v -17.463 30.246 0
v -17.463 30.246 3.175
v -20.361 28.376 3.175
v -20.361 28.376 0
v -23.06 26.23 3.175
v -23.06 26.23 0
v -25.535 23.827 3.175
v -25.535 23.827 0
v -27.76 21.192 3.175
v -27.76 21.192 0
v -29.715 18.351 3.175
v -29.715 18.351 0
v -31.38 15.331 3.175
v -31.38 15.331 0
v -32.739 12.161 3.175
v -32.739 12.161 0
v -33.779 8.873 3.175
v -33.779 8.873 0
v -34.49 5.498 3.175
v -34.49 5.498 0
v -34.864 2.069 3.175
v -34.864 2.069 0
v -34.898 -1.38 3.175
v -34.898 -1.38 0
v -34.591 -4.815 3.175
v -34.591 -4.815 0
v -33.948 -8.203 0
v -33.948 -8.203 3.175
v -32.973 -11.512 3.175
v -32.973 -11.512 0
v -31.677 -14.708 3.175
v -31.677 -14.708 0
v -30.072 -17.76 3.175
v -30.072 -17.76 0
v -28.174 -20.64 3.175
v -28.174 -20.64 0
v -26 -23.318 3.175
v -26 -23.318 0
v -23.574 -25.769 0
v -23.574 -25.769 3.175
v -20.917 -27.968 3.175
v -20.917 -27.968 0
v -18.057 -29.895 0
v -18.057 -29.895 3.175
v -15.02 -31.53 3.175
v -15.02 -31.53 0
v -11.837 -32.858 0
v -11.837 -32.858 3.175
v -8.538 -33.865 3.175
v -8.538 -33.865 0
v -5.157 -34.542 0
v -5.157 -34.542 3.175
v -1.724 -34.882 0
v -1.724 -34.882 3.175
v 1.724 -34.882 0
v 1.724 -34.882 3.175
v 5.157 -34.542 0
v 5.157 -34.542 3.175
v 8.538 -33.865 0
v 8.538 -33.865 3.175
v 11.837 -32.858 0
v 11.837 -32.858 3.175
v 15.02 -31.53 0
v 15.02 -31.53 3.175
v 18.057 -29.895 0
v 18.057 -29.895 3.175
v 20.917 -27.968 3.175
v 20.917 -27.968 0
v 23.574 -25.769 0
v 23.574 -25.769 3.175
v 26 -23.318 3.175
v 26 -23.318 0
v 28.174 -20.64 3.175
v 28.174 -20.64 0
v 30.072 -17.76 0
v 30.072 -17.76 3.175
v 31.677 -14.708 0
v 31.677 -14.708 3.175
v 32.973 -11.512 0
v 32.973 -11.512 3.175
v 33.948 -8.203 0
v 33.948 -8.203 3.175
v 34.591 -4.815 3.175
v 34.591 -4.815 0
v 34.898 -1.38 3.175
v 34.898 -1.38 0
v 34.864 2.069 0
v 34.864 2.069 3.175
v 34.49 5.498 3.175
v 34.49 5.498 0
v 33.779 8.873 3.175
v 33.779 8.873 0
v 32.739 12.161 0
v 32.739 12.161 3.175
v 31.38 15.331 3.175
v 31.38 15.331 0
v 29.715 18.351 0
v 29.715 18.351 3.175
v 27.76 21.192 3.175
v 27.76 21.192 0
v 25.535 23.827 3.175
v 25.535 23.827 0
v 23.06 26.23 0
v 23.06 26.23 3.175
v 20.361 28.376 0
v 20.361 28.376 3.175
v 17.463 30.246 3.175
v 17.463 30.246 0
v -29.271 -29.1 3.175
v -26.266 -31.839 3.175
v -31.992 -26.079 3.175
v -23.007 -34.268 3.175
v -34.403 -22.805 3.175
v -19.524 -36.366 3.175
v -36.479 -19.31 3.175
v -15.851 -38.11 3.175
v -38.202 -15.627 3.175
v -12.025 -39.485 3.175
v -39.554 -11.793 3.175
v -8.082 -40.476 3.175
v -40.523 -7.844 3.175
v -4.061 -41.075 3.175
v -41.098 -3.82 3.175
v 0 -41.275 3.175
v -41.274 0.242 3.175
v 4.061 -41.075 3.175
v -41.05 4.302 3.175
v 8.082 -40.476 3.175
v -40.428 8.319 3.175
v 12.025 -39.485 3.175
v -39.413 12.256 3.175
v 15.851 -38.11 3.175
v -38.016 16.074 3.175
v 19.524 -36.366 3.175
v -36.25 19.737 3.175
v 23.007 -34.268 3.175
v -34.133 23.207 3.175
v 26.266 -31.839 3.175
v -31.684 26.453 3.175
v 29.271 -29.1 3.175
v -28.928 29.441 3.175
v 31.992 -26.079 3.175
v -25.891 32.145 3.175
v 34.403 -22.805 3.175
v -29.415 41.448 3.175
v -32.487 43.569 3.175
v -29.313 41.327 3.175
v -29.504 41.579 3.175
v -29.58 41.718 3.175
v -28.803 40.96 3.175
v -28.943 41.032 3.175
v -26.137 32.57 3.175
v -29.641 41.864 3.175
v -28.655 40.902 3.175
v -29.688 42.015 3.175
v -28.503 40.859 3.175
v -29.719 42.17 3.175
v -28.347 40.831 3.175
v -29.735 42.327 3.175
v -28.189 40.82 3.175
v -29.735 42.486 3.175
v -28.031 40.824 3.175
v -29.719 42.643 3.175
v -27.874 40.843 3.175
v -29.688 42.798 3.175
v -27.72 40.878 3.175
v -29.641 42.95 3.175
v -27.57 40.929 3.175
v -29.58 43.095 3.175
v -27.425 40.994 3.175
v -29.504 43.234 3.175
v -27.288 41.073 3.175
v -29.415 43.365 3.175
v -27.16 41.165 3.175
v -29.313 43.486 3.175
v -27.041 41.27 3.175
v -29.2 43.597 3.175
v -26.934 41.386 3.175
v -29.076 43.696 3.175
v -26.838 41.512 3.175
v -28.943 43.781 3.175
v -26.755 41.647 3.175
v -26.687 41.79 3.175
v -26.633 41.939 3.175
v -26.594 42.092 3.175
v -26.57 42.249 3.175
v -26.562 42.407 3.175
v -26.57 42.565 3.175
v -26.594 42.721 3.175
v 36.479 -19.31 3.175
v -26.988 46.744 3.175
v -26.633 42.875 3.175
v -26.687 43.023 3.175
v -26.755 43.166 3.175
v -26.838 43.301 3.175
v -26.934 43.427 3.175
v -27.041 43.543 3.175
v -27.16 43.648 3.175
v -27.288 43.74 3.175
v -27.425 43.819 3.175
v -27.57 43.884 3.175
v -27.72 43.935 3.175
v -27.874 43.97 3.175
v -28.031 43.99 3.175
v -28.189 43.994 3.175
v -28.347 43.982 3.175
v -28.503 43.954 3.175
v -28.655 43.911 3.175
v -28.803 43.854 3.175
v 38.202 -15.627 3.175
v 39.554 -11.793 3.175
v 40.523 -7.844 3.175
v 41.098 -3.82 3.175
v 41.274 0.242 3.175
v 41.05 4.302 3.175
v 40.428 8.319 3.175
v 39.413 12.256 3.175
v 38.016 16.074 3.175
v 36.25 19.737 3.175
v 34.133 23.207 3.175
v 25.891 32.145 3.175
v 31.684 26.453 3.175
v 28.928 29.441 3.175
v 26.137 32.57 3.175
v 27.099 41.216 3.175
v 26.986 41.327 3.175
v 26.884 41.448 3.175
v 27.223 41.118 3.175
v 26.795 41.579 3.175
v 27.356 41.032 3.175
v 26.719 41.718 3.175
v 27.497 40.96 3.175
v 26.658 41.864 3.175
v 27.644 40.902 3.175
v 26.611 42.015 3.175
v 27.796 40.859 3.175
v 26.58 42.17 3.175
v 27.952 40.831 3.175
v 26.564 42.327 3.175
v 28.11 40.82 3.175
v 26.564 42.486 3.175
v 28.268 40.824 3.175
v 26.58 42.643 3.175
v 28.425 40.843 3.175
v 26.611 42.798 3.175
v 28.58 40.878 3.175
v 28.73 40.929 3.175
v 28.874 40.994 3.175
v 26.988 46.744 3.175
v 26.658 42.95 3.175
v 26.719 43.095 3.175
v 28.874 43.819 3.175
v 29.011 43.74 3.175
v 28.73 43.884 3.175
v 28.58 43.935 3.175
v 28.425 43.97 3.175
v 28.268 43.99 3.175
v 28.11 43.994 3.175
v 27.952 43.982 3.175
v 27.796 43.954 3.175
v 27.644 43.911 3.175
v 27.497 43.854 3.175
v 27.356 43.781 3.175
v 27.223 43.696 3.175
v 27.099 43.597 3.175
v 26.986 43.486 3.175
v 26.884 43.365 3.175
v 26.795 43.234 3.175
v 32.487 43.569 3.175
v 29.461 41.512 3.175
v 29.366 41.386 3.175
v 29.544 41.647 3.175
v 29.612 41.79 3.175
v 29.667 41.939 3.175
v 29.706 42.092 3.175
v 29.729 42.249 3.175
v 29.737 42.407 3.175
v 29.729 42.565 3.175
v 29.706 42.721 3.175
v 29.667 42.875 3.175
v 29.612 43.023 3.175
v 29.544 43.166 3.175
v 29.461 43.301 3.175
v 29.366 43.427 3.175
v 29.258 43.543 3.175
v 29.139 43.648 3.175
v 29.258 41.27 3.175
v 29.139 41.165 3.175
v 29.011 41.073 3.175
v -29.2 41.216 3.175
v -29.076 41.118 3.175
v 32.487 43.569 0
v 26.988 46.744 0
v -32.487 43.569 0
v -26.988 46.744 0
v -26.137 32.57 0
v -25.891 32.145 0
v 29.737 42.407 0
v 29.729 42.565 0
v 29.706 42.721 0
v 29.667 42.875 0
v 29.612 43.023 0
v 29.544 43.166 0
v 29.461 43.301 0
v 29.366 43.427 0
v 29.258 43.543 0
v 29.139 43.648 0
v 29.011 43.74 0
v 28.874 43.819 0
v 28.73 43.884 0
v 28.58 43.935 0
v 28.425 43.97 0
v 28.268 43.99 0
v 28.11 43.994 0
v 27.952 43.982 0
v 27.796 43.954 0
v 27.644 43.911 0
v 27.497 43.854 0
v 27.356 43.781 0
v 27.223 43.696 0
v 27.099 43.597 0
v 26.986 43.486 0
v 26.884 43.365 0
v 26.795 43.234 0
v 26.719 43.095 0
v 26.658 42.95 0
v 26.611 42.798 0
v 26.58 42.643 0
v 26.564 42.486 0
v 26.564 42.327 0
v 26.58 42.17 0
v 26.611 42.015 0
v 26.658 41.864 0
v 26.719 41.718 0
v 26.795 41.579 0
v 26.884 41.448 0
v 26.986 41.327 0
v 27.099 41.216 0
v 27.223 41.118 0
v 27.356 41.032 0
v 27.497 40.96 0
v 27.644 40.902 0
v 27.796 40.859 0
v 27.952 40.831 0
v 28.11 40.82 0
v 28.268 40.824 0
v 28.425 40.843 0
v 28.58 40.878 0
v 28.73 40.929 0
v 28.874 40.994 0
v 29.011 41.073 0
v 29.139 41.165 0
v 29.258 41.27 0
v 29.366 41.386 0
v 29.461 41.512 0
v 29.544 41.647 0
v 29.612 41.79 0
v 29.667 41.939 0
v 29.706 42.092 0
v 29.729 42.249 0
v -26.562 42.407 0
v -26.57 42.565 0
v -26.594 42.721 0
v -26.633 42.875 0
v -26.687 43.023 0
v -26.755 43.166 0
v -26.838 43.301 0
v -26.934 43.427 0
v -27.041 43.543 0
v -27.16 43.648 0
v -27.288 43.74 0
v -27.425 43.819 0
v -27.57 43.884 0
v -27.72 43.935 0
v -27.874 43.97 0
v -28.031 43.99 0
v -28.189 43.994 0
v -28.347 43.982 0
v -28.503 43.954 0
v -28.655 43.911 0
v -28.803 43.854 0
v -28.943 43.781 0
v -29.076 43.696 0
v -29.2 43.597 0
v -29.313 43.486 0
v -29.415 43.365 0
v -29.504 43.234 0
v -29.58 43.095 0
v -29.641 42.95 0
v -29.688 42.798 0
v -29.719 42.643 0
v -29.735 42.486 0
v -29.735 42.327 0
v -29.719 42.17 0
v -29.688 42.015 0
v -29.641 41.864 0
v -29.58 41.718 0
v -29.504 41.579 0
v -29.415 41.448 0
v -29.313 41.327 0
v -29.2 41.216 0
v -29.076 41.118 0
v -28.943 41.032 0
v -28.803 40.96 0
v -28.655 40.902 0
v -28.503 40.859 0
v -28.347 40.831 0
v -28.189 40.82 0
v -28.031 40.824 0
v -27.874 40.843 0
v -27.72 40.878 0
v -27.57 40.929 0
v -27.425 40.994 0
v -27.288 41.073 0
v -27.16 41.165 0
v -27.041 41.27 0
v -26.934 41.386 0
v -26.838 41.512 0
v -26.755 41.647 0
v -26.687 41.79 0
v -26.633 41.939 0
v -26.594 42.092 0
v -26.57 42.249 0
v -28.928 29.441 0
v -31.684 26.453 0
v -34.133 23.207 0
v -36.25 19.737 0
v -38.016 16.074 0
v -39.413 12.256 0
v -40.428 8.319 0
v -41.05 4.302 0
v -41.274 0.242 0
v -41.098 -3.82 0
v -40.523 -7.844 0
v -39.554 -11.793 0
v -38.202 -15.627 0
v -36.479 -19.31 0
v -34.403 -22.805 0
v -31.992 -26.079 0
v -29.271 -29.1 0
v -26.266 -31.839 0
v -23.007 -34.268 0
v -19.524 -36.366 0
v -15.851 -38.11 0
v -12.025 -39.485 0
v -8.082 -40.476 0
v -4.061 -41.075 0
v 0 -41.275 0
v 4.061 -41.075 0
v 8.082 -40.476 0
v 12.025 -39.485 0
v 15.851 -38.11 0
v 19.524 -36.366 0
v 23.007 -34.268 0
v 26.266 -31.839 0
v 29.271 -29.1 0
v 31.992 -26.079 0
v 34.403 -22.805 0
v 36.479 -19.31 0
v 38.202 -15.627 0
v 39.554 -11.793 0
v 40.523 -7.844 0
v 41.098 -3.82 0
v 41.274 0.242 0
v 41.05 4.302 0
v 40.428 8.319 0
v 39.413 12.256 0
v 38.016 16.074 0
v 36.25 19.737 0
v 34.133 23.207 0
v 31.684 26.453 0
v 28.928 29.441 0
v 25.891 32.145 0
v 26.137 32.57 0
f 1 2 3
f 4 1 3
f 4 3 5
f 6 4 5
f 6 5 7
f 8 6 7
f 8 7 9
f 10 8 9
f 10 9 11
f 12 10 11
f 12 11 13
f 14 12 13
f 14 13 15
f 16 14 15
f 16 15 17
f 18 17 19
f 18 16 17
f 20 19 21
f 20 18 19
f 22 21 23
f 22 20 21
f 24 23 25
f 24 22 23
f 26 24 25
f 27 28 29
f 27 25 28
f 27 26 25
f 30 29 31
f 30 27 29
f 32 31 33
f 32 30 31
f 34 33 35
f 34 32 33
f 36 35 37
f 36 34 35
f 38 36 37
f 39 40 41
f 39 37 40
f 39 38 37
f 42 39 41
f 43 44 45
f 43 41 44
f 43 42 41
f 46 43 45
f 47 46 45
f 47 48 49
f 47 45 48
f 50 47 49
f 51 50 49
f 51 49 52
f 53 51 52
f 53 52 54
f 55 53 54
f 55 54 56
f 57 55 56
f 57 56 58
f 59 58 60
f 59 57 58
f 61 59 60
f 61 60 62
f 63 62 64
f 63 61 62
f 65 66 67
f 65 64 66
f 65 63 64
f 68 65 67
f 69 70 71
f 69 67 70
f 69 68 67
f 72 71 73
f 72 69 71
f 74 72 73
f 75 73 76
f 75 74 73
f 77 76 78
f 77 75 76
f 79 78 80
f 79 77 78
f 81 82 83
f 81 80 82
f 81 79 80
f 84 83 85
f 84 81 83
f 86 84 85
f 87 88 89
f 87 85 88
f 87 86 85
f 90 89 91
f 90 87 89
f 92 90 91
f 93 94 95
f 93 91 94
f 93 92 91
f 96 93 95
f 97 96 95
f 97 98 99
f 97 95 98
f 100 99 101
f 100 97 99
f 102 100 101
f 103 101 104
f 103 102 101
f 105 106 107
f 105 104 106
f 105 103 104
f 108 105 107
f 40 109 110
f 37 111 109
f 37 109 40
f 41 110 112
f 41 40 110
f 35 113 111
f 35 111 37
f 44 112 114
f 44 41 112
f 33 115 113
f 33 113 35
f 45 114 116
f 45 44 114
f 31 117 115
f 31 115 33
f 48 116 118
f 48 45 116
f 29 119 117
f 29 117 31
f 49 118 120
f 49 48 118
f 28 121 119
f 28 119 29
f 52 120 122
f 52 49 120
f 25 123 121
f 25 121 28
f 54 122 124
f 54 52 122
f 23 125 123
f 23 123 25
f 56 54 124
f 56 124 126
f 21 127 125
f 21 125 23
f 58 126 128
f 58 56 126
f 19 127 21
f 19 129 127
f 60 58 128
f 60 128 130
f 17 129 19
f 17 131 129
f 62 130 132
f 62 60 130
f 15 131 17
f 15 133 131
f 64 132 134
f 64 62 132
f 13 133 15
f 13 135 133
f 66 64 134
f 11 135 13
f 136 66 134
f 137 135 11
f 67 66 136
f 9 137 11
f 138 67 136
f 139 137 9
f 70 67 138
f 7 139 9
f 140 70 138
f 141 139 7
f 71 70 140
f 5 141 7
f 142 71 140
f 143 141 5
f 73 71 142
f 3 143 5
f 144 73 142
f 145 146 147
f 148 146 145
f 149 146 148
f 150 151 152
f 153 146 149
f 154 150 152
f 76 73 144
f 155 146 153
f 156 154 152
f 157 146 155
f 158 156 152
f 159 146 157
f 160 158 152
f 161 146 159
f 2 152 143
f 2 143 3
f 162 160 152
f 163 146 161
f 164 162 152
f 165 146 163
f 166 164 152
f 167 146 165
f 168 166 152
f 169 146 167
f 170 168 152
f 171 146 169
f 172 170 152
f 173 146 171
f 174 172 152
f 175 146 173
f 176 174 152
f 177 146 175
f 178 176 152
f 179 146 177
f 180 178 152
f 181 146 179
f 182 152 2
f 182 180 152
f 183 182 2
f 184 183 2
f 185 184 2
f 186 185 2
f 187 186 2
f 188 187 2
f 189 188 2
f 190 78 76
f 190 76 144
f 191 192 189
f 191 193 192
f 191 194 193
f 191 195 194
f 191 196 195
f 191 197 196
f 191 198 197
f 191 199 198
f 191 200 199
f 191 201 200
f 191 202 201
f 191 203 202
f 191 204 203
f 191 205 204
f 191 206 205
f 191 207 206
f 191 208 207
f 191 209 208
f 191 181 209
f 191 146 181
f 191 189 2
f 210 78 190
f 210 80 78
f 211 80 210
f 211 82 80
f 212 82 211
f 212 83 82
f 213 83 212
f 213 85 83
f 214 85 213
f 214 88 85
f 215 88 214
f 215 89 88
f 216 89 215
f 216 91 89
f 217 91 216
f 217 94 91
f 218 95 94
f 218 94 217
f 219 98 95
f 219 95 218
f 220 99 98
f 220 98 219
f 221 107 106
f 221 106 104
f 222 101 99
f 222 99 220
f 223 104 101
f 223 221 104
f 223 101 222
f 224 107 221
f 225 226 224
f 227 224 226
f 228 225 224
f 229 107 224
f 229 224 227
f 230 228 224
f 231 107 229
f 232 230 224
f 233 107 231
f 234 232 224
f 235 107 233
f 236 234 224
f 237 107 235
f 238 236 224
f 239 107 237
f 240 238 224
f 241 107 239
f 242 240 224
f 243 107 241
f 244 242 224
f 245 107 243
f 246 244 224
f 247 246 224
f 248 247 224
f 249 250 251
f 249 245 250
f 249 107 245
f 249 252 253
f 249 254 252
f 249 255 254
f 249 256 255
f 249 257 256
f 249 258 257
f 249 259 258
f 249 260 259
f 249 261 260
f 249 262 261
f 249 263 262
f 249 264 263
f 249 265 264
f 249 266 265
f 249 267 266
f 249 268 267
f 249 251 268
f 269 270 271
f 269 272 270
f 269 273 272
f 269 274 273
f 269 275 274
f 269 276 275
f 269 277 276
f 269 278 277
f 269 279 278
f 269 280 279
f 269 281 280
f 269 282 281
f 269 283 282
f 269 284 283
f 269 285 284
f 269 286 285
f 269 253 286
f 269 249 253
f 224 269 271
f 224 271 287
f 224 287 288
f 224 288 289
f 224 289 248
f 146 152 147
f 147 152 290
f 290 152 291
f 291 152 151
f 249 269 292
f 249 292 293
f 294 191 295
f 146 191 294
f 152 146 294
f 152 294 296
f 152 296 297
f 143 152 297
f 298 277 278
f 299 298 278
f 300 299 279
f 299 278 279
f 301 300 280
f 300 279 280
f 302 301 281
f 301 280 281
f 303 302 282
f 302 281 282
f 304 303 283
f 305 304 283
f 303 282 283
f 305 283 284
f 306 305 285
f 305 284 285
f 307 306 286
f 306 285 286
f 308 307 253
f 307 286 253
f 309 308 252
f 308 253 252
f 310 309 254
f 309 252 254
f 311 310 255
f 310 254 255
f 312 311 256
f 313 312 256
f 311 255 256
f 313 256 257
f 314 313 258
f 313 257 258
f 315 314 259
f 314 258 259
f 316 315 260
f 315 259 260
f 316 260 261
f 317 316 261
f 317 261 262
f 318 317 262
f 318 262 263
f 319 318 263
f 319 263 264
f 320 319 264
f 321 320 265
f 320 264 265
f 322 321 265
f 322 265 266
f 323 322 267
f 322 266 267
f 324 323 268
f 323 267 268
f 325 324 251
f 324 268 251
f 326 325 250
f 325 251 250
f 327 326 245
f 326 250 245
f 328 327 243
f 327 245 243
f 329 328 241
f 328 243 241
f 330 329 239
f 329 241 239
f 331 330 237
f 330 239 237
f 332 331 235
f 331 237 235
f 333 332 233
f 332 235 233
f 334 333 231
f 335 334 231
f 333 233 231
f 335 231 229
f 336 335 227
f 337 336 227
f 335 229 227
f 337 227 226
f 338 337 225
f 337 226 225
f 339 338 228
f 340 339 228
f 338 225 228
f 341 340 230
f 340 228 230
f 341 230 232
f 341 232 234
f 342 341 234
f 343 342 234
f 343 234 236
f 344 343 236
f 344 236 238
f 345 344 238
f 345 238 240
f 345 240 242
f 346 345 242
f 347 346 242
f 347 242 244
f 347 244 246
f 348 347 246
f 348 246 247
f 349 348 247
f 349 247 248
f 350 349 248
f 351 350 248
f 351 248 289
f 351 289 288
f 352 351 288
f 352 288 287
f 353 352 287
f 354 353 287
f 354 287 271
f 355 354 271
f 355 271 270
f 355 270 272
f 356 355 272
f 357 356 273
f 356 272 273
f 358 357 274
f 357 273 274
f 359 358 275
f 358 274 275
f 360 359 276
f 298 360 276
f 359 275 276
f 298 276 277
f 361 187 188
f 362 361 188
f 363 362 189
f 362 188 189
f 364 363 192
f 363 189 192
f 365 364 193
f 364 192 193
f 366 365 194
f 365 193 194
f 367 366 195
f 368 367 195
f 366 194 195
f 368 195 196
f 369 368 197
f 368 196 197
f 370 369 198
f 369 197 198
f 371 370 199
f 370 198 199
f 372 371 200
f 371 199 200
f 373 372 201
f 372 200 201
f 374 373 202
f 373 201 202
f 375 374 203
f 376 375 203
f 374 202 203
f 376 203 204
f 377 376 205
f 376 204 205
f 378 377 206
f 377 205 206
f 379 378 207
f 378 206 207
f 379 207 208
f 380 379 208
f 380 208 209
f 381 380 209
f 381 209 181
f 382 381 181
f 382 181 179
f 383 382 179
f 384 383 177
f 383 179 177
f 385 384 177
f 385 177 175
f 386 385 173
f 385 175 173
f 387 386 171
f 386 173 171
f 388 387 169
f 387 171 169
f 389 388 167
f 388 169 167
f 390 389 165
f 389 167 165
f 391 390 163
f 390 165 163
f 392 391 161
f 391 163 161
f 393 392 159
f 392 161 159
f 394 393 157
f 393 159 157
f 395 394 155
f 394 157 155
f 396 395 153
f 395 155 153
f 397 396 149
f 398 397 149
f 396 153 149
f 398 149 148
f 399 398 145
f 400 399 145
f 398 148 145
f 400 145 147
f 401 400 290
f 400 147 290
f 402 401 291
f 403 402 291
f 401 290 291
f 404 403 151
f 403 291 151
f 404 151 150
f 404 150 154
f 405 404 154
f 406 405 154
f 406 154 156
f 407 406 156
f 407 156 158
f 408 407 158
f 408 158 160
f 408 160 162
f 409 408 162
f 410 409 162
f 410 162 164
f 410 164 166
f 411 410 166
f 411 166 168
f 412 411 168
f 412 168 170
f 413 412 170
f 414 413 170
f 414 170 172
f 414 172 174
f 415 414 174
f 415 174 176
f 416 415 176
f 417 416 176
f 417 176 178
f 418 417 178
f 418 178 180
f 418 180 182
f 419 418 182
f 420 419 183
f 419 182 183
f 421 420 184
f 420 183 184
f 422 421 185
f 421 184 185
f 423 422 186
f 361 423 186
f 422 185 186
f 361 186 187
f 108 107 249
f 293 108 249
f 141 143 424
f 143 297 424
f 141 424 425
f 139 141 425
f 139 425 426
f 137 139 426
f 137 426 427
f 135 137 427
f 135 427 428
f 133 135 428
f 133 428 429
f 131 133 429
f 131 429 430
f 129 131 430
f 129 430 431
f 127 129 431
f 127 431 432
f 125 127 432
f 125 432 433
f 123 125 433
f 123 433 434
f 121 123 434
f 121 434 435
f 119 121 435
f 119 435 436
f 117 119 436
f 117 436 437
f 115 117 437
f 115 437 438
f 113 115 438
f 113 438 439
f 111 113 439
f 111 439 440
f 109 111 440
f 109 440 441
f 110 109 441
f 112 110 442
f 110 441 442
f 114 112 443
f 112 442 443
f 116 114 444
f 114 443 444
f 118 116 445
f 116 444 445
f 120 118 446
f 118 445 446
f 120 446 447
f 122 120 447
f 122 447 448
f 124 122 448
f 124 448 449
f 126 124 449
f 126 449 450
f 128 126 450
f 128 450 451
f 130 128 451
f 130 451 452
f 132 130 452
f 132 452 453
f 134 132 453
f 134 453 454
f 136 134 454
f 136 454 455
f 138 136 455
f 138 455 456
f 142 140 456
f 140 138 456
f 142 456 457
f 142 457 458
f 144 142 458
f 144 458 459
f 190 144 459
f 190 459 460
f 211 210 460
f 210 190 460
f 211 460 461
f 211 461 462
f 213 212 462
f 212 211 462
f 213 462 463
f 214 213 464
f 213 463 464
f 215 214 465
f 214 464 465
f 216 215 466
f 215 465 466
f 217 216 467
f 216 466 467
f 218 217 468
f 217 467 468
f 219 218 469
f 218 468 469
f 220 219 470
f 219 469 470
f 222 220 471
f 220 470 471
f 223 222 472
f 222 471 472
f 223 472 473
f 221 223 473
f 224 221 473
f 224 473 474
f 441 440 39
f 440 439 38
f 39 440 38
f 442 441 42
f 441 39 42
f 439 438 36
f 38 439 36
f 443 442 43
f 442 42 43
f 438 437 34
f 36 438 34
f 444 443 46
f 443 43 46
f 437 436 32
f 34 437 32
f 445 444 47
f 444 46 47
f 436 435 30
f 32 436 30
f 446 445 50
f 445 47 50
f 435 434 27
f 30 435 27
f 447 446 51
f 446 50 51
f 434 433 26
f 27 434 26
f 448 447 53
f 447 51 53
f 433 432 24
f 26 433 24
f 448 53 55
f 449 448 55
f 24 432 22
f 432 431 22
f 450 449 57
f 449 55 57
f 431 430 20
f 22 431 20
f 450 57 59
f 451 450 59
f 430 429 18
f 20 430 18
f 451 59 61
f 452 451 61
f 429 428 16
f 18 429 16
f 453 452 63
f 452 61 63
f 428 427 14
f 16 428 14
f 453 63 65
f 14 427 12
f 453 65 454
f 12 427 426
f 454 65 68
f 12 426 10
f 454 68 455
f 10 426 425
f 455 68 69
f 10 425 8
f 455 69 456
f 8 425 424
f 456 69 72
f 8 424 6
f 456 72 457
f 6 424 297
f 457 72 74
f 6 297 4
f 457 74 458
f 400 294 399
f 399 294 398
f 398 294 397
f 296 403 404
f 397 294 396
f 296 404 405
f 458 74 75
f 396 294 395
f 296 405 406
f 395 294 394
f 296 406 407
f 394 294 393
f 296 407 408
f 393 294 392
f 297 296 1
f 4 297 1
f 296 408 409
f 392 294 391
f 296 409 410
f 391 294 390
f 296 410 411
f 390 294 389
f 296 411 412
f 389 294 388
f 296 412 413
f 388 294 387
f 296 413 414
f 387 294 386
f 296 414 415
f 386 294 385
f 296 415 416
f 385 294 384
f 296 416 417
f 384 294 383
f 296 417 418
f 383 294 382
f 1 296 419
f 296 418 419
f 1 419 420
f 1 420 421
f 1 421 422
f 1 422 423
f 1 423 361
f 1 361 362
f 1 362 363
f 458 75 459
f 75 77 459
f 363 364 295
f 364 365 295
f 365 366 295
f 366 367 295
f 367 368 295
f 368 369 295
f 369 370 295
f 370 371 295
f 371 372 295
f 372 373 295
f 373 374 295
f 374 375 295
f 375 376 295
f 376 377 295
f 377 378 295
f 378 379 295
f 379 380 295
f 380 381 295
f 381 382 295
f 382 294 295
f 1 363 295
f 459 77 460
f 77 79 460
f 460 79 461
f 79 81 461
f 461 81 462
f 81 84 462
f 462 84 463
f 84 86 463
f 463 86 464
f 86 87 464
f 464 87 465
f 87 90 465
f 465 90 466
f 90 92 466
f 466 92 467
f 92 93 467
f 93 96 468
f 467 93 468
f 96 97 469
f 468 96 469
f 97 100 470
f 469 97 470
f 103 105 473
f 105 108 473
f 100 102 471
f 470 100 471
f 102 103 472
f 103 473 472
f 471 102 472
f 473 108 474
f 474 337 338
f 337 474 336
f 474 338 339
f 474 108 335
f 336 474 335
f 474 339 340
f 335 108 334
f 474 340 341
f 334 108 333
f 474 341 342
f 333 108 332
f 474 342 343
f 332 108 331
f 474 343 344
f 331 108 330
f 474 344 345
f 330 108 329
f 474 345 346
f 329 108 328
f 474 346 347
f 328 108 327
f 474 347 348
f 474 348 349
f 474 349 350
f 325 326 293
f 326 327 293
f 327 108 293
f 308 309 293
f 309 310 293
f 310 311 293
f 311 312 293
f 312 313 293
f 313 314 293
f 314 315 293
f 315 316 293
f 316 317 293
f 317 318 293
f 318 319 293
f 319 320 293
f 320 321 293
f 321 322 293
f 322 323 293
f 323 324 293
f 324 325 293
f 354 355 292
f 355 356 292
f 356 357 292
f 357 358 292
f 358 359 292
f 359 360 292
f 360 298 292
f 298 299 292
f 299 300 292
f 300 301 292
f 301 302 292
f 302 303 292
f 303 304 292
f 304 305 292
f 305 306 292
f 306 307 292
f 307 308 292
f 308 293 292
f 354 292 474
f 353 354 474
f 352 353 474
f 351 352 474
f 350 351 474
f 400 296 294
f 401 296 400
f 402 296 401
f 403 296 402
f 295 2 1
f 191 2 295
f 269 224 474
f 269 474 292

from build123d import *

# Parameters (mm, degrees)
SKETCH2_R           = 41.275
SKETCH2_R_2         = 38.1
SKETCH2_R_3         = 34.925
BOSS_EXTRUDE1_DEPTH = 3.175
SKETCH3_R           = 1.5875
BOSS_EXTRUDE2_DEPTH = 3.175
CUT_EXTRUDE1_DEPTH  = 3.175


with BuildPart() as part:
    # Sketch2 → Boss-Extrude1 (new body)
    with BuildSketch(Plane.XY):
        Circle(SKETCH2_R)
        Circle(SKETCH2_R_2, mode=Mode.SUBTRACT)
        Circle(SKETCH2_R_2)
        Circle(SKETCH2_R_3, mode=Mode.SUBTRACT)
    extrude(amount=BOSS_EXTRUDE1_DEPTH)

    # Sketch3 → Boss-Extrude2 (add)
    with BuildSketch(Plane.XY.offset(3.175)):
        with BuildLine():
            ThreePointArc((-25.891068033, 32.144645295), (-23.333836091, 34.046405365), (-20.6375, 35.745198541))
            Line((-20.6375, 35.745198541), (-26.9875, 46.743721169))
            Line((-26.9875, 46.743721169), (-32.486761314, 43.568721169))
            Line((-32.486761314, 43.568721169), (-26.136761314, 32.570198541))
            Line((-26.136761314, 32.570198541), (-25.891068033, 32.144645295))
        make_face()
        with Locations((-28.149630657, 42.406590512)):
            Circle(SKETCH3_R, mode=Mode.SUBTRACT)
        with BuildLine():
            Line((26.9875, 46.743721169), (20.6375, 35.745198541))
            ThreePointArc((20.6375, 35.745198541), (23.333836091, 34.046405365), (25.891068033, 32.144645295))
            Line((25.891068033, 32.144645295), (26.136761314, 32.570198541))
            Line((26.136761314, 32.570198541), (32.486761314, 43.568721169))
            Line((32.486761314, 43.568721169), (26.9875, 46.743721169))
        make_face()
        with Locations((28.149630657, 42.406590512)):
            Circle(SKETCH3_R, mode=Mode.SUBTRACT)
    extrude(amount=-BOSS_EXTRUDE2_DEPTH)

    # Sketch5 → Cut-Extrude1 (cut)
    with BuildSketch(Plane.XY.offset(3.175)):
        with BuildLine():
            Line((-20.6375, 35.745198541), (0, 0))
            Line((0, 0), (20.6375, 35.745198541))
            ThreePointArc((20.6375, 35.745198541), (0, 41.275), (-20.6375, 35.745198541))
        make_face()
    extrude(amount=-CUT_EXTRUDE1_DEPTH, mode=Mode.SUBTRACT)


solid = part.part
